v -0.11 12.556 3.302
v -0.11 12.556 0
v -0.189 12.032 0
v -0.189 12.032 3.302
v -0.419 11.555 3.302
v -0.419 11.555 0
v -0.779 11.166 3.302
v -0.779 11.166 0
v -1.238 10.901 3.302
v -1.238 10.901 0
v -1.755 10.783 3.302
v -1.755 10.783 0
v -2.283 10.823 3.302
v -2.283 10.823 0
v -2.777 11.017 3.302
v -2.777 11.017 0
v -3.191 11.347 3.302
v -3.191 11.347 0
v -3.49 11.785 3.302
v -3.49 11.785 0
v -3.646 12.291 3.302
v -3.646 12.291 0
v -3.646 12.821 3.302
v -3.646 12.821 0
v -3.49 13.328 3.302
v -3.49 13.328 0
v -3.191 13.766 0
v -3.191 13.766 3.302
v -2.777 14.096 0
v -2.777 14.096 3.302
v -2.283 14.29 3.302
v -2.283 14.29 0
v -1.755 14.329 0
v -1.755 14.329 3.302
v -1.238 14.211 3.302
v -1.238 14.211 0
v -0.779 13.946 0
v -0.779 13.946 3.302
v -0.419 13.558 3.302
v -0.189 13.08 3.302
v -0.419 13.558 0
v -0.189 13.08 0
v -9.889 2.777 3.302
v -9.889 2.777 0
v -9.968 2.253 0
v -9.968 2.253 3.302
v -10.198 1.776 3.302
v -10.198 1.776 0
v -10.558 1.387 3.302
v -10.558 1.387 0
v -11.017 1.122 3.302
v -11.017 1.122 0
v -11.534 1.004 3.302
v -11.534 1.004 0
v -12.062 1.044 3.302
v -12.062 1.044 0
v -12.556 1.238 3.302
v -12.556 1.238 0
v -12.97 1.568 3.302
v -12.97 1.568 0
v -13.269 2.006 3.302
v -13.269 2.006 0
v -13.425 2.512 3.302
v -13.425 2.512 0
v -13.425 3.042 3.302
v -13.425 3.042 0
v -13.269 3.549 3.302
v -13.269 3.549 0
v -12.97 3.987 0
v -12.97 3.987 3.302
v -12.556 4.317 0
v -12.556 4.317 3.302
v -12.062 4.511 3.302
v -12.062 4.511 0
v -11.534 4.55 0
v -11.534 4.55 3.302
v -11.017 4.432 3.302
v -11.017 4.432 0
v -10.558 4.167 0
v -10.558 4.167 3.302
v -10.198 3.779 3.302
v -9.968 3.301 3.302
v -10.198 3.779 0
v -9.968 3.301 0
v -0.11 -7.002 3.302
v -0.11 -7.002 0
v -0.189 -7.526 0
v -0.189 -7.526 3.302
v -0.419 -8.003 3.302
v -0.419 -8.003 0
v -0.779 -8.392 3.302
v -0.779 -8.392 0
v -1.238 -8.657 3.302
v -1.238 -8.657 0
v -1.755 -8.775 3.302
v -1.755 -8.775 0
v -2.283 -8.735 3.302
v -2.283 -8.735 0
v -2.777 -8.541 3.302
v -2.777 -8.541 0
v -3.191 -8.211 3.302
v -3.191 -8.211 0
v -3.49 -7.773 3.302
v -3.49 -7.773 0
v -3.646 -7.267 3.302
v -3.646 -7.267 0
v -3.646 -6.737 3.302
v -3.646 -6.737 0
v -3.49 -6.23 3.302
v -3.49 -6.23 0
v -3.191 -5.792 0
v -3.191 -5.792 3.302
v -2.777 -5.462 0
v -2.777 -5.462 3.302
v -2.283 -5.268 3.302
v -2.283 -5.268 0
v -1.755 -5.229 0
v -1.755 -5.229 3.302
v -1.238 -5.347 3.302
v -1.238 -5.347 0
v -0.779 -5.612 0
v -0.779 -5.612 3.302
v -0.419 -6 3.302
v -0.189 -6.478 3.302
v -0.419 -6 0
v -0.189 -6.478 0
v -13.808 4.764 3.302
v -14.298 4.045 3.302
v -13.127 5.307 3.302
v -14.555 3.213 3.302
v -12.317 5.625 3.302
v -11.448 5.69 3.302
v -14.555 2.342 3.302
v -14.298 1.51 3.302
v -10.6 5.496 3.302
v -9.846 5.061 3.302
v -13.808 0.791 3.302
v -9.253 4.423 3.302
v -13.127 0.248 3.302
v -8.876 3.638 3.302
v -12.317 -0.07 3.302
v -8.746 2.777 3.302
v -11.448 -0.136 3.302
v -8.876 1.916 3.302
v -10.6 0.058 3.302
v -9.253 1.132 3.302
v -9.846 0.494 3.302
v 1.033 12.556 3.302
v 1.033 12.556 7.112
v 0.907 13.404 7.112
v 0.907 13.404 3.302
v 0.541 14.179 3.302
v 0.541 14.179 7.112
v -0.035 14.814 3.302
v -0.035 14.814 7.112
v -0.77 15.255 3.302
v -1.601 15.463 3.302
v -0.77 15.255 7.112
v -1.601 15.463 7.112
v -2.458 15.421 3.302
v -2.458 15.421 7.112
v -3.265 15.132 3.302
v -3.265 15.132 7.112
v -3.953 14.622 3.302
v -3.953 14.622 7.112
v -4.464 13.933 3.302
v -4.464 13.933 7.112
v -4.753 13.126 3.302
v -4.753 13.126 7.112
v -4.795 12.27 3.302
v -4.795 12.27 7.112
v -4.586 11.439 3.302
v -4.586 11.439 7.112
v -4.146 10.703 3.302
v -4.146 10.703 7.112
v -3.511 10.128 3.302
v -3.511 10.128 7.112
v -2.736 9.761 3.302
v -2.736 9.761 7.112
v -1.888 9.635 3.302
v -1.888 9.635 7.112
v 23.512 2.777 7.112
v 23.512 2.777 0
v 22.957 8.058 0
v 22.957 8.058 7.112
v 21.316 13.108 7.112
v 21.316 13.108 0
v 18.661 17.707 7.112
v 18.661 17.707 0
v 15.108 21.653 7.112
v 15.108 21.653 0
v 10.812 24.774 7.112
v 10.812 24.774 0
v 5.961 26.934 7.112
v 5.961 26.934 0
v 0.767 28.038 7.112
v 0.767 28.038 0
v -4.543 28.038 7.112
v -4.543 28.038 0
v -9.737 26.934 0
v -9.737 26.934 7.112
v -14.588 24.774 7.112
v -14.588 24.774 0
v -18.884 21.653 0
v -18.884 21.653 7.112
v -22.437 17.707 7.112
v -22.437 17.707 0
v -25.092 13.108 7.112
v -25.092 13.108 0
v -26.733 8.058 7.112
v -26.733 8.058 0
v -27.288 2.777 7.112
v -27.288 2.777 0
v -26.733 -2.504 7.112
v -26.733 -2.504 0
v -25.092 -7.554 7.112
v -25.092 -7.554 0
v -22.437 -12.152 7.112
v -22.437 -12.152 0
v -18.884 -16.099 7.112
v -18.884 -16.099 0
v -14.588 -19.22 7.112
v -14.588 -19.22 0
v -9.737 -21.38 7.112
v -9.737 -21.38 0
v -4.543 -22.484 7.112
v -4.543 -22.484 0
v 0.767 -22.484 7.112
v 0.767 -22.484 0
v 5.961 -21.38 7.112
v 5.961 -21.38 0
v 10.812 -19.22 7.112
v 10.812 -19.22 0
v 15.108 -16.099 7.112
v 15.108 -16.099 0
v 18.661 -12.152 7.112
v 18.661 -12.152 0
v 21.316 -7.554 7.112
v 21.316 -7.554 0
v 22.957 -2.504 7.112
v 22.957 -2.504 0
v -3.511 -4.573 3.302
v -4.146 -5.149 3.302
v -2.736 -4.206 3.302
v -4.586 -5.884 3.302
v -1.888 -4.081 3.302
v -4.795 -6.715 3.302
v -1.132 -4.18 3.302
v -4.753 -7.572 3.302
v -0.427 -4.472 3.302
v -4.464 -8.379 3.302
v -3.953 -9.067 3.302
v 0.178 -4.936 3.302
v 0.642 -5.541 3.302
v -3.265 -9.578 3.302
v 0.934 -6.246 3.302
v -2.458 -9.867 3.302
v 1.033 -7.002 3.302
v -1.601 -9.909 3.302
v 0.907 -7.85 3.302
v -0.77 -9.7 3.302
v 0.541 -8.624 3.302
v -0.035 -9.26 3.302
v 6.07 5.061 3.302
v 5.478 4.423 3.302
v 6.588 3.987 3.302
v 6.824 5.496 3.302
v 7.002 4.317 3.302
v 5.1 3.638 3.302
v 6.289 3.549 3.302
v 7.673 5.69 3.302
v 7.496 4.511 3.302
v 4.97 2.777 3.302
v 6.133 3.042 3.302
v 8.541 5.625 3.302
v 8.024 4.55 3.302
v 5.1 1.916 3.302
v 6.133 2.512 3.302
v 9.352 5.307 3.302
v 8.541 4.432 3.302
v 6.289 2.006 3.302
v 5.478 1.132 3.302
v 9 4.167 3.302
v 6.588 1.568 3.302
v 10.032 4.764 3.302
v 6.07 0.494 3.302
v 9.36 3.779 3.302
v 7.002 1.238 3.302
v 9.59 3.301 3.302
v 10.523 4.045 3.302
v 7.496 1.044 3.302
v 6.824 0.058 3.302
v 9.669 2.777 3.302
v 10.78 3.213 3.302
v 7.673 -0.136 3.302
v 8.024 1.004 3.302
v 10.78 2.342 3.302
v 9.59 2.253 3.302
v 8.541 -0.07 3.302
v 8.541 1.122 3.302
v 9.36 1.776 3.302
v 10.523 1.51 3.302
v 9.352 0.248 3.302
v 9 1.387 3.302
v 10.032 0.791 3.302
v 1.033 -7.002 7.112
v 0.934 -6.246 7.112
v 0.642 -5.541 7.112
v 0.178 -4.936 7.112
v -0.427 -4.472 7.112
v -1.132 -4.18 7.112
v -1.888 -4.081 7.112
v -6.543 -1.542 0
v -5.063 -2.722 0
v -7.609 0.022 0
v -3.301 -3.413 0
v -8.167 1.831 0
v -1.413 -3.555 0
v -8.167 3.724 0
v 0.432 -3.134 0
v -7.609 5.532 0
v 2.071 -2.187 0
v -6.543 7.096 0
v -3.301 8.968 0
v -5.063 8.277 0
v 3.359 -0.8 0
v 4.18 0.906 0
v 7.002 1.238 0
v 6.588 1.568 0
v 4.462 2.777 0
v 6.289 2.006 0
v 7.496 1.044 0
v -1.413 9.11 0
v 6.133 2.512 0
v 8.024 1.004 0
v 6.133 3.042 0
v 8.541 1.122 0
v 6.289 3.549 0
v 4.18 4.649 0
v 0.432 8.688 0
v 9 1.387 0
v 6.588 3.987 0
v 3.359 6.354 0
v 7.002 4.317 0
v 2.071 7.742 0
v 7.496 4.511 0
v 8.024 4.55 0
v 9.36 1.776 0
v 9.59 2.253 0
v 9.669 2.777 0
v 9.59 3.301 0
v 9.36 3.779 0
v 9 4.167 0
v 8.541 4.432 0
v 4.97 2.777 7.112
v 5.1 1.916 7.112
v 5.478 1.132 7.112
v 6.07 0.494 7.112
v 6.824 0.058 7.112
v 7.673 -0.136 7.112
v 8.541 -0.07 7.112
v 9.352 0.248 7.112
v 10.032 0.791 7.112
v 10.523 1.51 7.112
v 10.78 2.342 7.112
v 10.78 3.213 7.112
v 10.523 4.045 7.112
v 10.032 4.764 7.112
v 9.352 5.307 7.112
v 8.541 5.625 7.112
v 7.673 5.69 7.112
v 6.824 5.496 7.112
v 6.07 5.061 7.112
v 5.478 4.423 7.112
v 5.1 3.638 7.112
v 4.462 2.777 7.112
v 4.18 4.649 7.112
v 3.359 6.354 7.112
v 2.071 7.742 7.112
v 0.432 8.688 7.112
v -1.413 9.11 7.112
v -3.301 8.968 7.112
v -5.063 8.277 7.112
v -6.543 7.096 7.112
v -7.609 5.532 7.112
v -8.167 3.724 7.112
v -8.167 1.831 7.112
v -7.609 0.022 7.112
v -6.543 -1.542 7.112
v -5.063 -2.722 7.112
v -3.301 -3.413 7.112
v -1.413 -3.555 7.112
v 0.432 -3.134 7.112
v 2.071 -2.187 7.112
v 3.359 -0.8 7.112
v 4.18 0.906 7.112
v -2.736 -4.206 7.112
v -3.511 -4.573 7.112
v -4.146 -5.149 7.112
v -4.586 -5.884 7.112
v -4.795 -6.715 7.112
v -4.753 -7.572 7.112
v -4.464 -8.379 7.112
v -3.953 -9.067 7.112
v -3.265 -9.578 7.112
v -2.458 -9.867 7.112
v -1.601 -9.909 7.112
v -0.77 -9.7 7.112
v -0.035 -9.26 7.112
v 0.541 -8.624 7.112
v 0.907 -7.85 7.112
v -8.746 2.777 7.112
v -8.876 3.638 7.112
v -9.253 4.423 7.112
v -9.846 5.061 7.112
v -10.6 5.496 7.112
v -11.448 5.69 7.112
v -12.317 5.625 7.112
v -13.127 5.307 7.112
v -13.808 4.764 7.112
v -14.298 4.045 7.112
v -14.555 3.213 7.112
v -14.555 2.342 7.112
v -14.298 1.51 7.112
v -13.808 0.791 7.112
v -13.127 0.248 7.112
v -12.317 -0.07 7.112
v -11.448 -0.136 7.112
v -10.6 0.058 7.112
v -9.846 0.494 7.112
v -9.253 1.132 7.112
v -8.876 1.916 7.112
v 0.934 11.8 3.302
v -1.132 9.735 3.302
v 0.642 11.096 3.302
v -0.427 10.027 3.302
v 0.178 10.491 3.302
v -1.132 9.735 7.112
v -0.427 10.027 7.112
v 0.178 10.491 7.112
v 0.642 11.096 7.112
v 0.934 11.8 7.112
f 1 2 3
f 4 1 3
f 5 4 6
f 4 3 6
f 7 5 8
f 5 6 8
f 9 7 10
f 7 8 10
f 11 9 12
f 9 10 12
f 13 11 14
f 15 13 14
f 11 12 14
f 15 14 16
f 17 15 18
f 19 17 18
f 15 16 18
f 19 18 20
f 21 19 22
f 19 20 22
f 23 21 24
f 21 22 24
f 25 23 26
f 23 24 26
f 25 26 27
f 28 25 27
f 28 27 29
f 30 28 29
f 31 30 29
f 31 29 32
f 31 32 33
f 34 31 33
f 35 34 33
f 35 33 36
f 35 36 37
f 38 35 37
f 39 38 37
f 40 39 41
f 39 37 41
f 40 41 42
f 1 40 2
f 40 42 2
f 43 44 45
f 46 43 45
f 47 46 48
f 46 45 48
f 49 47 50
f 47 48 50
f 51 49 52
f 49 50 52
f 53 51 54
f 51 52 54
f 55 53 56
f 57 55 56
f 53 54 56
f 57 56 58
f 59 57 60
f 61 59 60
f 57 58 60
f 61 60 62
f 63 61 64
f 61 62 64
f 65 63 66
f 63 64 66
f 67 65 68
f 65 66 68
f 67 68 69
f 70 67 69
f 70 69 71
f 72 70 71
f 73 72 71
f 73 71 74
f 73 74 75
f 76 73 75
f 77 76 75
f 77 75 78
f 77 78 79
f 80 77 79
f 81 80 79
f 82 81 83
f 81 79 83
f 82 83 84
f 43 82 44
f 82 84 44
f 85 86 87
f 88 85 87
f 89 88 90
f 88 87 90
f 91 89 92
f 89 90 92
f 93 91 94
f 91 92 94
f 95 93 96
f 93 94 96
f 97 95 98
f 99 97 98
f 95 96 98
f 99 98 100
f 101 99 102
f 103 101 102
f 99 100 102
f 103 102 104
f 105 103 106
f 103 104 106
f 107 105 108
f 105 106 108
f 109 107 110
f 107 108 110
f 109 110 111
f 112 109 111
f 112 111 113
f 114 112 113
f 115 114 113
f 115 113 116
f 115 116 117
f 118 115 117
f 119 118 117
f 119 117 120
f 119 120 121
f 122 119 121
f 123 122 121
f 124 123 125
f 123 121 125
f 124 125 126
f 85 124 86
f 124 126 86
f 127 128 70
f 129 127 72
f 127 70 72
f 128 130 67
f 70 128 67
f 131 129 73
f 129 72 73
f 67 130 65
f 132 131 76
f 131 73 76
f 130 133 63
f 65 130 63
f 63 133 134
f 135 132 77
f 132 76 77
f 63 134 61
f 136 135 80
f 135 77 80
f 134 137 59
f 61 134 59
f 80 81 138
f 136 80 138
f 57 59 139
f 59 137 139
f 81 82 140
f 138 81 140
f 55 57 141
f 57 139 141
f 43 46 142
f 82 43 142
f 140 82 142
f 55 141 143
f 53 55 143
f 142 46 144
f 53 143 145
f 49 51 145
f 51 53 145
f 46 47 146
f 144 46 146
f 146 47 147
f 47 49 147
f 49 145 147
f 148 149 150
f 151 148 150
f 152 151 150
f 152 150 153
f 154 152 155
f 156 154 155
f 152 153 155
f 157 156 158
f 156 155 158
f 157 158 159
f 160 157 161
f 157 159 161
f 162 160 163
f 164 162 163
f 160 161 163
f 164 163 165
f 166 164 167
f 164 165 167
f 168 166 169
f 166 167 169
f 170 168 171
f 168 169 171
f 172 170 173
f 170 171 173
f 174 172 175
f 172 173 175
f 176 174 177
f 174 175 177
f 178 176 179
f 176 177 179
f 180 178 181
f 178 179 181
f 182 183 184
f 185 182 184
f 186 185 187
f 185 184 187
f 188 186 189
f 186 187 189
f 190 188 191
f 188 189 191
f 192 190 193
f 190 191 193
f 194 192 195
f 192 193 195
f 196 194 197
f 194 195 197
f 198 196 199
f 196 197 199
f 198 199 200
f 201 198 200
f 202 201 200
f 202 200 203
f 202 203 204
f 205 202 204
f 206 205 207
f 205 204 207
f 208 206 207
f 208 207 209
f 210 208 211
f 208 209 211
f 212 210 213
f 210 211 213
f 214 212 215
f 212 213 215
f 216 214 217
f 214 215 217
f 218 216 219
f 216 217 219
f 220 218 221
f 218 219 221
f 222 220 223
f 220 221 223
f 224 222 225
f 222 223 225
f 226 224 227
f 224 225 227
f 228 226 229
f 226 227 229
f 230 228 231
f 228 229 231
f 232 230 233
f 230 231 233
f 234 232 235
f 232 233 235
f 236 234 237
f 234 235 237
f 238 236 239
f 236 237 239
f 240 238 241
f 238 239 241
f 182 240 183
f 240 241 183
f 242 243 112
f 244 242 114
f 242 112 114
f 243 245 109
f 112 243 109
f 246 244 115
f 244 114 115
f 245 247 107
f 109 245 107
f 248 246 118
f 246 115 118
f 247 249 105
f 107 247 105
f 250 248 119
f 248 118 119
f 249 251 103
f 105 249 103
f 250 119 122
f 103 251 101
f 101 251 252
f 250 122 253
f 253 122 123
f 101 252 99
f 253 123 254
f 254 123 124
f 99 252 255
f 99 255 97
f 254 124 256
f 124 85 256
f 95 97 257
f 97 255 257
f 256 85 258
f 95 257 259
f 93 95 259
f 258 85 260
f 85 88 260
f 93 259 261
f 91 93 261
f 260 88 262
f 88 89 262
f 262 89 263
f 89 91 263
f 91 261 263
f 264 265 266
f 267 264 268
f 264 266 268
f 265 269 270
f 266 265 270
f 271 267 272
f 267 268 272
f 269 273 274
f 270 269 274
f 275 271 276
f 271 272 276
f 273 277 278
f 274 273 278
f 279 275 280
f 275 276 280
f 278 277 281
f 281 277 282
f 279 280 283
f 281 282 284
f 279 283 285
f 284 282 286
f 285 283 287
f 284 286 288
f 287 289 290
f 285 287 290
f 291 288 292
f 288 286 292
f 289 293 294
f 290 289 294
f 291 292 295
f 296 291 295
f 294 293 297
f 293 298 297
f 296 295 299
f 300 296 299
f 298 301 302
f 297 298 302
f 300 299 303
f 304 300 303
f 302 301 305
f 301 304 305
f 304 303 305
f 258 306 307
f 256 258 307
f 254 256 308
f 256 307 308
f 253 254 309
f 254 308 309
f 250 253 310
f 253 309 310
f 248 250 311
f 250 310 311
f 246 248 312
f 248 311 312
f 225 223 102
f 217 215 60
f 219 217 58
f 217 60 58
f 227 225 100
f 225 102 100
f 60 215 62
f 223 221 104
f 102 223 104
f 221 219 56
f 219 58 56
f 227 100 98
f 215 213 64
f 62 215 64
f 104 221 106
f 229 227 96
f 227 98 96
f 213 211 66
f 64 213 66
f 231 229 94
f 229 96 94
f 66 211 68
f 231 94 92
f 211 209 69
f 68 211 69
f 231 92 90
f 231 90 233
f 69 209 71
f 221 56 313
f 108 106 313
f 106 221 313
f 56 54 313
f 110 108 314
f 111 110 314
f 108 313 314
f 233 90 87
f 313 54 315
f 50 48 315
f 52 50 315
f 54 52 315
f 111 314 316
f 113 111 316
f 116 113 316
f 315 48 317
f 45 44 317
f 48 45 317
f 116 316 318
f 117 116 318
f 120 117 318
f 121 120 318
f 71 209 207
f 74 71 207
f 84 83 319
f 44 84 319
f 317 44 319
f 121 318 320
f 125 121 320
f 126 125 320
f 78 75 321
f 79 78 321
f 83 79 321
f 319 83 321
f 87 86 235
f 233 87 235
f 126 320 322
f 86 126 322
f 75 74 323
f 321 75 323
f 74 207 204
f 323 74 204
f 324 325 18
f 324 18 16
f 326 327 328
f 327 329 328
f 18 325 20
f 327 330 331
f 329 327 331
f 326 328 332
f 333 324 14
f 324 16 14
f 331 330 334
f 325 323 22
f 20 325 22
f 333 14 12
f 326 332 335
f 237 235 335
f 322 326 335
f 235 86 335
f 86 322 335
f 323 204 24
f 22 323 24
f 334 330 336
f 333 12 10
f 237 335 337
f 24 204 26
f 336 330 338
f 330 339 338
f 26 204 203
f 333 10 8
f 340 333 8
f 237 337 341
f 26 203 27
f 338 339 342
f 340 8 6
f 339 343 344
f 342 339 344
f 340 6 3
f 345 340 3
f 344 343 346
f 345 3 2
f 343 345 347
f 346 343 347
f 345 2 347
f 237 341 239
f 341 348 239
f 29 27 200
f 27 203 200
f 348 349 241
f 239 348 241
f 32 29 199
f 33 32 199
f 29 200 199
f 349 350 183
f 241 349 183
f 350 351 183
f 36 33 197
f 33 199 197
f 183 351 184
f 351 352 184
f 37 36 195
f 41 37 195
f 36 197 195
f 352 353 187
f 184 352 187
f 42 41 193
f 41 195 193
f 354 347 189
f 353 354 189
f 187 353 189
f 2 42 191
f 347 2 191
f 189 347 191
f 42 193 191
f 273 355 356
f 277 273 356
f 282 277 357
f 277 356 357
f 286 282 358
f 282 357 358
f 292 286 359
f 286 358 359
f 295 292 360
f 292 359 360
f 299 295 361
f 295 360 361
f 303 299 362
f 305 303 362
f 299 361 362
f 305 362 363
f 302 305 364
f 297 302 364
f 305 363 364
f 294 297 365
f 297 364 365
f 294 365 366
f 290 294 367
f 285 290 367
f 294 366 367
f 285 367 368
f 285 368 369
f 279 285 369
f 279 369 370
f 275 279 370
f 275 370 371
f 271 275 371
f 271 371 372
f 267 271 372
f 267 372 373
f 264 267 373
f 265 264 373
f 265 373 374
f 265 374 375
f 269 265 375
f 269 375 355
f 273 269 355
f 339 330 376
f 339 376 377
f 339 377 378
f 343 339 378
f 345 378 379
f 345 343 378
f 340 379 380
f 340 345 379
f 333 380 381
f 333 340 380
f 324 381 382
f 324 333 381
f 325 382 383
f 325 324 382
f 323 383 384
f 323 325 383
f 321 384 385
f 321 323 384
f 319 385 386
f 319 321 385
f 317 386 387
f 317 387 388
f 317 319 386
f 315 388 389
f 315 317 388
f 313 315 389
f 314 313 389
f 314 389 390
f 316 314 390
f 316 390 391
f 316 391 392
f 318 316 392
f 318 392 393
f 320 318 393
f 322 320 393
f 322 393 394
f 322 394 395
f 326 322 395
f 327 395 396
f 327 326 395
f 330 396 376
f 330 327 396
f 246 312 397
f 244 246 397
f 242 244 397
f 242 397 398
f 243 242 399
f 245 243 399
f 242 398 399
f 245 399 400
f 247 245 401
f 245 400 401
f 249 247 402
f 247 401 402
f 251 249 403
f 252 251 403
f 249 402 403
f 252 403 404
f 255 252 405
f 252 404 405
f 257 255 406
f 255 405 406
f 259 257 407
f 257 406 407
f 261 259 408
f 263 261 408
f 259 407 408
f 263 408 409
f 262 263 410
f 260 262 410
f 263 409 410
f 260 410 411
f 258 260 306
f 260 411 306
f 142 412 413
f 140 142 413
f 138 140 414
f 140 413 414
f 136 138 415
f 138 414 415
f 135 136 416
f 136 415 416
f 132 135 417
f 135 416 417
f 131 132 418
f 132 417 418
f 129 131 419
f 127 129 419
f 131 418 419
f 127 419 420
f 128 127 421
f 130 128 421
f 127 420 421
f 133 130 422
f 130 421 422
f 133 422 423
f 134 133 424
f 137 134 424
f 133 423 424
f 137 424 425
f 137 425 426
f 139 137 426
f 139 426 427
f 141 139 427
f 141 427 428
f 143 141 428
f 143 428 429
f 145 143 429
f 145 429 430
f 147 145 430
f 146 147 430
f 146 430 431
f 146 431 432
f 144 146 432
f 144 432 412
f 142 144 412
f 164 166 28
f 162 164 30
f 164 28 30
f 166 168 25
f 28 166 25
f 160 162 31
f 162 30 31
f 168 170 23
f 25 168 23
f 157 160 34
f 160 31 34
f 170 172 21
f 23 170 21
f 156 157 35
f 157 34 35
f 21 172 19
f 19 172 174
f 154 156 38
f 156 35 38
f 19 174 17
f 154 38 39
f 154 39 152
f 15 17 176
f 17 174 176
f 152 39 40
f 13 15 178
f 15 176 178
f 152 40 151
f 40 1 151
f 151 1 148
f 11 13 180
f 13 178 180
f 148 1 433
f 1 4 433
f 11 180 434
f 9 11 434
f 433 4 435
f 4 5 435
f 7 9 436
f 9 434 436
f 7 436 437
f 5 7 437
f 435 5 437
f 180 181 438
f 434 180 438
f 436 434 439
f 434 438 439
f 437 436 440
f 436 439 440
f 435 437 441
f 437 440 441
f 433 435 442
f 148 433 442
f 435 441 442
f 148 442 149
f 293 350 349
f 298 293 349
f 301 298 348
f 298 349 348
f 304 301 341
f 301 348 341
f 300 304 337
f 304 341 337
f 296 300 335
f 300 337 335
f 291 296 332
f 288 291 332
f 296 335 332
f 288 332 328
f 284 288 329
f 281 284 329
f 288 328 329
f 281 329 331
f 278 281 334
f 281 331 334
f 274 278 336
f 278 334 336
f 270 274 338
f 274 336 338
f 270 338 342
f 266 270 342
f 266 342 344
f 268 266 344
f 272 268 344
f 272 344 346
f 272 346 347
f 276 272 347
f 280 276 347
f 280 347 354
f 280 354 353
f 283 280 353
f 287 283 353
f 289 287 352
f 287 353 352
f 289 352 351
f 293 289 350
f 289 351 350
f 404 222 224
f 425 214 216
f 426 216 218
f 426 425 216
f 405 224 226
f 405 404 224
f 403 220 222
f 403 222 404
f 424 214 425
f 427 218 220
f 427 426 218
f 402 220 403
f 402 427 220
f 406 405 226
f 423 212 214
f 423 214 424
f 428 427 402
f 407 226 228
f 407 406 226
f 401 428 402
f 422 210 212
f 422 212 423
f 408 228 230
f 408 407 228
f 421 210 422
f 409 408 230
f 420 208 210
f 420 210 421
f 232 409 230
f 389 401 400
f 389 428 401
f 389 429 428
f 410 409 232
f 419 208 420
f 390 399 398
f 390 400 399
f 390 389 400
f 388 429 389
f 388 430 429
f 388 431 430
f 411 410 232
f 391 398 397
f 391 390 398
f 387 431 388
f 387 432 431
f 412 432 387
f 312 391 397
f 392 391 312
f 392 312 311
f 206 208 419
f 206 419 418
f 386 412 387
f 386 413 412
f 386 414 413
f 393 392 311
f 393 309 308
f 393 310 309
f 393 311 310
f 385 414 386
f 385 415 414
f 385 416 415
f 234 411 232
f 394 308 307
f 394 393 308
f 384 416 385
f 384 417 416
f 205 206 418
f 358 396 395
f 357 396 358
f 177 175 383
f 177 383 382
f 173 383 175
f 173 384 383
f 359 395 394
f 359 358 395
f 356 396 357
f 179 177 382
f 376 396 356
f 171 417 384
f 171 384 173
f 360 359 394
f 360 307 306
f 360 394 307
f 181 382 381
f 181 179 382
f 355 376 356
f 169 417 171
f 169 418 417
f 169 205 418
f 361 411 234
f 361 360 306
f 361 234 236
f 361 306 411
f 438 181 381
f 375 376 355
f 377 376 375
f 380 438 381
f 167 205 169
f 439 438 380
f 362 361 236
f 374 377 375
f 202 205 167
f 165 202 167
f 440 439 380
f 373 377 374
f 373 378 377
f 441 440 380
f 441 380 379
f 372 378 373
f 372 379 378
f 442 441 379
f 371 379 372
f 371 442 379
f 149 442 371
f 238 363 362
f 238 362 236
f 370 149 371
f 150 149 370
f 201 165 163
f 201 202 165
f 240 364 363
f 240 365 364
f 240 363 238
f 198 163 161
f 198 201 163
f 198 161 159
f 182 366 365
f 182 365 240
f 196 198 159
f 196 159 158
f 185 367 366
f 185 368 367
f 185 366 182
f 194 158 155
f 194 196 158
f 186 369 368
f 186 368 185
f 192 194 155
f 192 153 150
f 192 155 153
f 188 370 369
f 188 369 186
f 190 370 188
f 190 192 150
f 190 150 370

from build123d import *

# Parameters (mm, degrees)
F0_R     = 25.4
F0_R_2   = 6.35
F1_DEPTH = 7.112
F2_R     = 2.921
F3_DEPTH = 25.4
F4_R     = 3.181952
F4_R_2   = 1.778
F4_R_3   = 3.147606
F4_R_4   = 3.161985
F4_R_5   = 3.109144
F5_DEPTH = 3.302


with BuildPart() as f1:
    # F0 (on Top) → F1 (new body)
    with BuildSketch(Plane.XY):
        with Locations((-1.887769, 2.777323)):
            Circle(F0_R)
        with Locations((-1.887769, 2.777323)):
            Circle(F0_R_2, mode=Mode.SUBTRACT)
    extrude(amount=F1_DEPTH)

    # F2 (on face) → F3 (cut)
    with BuildSketch(Plane.XY.offset(7.112)):
        with BuildLine():
            ThreePointArc((1.033231, 12.556323), (-3.953228, 14.621782), (-1.887769, 9.635323))
            ThreePointArc((-1.887769, 9.635323), (0.17769, 10.490864), (1.033231, 12.556323))
        make_face()
        with BuildLine():
            ThreePointArc((1.033231, -7.001677), (0.17769, -4.936218), (-1.887769, -4.080677))
            ThreePointArc((-1.887769, -4.080677), (-3.953228, -9.067136), (1.033231, -7.001677))
        make_face()
        with Locations((-11.666769, 2.777323)):
            Circle(F2_R)
        with BuildLine():
            ThreePointArc((10.812231, 2.777323), (7.891231, 5.698323), (4.970231, 2.777323))
            ThreePointArc((4.970231, 2.777323), (7.891231, -0.143677), (10.812231, 2.777323))
        make_face()
    extrude(amount=-F3_DEPTH, mode=Mode.SUBTRACT)

    # F4 (on face) → F5 (join)
    with BuildSketch(Plane(origin=(0, 0, 0), x_dir=(1, 0, 0), z_dir=(0, 0, -1))):
        with Locations((-1.887769, 7.001677)):
            Circle(F4_R)
        with Locations((-1.887769, 7.001677)):
            Circle(F4_R_2, mode=Mode.SUBTRACT)
        with Locations((7.891231, -2.777323)):
            Circle(F4_R_3)
        with Locations((7.891231, -2.777323)):
            Circle(F4_R_2, mode=Mode.SUBTRACT)
        with Locations((-1.887769, -12.556323)):
            Circle(F4_R_4)
        with Locations((-1.887769, -12.556323)):
            Circle(F4_R_2, mode=Mode.SUBTRACT)
        with Locations((-11.666769, -2.777323)):
            Circle(F4_R_5)
        with Locations((-11.666769, -2.777323)):
            Circle(F4_R_2, mode=Mode.SUBTRACT)
    extrude(amount=-F5_DEPTH)


solid = f1.part
